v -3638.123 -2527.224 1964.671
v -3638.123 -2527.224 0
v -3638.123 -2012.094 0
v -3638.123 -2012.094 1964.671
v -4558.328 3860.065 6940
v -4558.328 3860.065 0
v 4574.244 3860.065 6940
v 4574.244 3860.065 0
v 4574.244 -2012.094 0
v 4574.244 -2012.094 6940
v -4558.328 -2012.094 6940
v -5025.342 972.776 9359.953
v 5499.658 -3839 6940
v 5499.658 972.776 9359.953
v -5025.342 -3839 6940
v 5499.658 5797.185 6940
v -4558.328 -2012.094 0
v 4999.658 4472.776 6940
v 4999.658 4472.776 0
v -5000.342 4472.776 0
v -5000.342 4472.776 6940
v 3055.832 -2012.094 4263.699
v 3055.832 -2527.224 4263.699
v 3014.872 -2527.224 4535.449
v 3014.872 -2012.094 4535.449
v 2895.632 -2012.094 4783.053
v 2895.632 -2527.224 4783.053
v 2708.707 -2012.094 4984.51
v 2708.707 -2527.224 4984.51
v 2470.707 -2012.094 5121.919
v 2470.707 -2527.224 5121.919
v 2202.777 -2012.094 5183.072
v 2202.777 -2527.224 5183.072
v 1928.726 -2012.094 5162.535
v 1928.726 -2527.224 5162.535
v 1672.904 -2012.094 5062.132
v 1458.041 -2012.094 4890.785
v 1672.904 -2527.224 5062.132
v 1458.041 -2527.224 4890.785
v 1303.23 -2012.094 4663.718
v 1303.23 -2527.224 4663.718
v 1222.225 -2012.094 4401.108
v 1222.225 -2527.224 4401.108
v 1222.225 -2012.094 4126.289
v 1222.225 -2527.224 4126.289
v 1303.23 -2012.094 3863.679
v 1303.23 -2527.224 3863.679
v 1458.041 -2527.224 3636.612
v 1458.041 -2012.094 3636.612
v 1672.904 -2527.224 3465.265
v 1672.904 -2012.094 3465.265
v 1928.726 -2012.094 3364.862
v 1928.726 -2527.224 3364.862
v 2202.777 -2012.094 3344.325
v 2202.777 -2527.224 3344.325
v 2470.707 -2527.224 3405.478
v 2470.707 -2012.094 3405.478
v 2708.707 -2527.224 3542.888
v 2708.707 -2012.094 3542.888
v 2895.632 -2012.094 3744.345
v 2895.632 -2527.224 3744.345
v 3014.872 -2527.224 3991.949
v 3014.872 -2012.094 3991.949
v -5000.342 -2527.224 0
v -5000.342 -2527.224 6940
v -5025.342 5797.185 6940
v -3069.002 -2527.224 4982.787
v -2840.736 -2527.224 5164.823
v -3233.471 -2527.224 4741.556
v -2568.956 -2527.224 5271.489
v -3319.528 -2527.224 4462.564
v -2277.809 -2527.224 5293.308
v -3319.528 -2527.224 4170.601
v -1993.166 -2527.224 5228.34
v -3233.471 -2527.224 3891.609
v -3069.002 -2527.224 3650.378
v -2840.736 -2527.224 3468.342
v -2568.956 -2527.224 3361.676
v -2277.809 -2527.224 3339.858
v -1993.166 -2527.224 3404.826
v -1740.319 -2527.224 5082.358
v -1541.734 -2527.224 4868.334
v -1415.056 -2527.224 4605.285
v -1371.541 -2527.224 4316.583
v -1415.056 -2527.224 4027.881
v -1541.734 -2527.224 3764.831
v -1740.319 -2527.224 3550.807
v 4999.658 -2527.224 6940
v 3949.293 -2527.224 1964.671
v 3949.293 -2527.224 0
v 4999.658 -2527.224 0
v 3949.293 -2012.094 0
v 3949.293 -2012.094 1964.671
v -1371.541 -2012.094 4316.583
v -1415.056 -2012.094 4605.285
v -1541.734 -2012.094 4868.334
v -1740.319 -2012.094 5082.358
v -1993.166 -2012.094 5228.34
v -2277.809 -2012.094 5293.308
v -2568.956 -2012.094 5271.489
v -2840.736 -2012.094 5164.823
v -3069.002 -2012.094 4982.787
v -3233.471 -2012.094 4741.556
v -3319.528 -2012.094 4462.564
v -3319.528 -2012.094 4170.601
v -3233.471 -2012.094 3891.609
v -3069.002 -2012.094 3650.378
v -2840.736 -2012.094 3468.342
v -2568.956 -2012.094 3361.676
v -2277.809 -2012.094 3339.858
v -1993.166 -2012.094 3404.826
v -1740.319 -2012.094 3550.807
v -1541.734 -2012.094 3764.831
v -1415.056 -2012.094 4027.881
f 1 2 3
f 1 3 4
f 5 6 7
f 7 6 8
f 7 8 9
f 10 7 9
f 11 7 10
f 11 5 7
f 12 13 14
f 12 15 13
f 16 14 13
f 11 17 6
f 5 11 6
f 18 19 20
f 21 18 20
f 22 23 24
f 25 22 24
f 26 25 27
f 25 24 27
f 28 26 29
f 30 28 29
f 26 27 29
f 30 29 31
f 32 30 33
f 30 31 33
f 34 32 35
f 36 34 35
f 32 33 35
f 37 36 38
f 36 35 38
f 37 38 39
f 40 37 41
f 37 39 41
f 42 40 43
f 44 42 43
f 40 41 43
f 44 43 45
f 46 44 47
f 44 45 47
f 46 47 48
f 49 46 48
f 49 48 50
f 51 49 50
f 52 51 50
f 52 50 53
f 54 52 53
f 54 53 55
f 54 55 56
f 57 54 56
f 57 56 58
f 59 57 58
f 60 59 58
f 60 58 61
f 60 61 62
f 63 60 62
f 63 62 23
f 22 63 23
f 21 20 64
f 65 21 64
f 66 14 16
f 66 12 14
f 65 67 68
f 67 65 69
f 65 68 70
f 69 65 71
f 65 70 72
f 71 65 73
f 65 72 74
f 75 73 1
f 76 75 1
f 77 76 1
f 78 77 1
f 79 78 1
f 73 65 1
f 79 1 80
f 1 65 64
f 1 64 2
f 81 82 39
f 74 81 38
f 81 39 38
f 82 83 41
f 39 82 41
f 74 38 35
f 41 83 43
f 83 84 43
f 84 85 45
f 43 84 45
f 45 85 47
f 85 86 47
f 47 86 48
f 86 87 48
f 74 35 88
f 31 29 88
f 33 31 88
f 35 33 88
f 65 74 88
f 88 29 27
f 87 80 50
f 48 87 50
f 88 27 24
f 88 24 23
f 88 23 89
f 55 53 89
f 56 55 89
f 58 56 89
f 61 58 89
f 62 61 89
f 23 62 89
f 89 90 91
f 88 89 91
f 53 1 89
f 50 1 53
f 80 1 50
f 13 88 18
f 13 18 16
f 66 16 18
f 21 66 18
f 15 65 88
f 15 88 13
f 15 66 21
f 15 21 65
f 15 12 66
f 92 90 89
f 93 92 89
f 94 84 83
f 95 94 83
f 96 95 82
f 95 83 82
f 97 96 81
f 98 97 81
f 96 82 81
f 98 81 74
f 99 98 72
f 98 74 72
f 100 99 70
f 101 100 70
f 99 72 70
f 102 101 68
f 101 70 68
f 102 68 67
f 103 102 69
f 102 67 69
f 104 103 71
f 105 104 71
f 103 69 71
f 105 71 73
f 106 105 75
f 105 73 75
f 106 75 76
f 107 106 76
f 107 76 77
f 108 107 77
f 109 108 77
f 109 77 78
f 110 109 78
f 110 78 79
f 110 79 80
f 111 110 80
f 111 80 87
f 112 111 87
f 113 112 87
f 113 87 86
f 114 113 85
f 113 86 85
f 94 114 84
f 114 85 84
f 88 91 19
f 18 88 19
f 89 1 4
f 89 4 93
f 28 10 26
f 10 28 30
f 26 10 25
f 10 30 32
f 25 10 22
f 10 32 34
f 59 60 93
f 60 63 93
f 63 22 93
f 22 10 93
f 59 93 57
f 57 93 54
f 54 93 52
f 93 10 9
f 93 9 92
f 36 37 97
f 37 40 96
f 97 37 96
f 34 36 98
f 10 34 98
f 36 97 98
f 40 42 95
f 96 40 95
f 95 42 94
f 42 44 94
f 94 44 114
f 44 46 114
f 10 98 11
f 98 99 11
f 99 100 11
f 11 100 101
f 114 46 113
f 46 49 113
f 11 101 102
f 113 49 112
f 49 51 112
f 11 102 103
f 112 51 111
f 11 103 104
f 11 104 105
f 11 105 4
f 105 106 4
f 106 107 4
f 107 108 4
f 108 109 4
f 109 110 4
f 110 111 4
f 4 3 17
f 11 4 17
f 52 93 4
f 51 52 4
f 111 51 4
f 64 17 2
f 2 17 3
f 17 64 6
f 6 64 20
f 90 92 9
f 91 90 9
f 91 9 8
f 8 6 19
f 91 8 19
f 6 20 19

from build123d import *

# Parameters (mm, degrees)
F0_W          = 1724.6506214142
F0_H          = 612.7116954488
F0_W_2        = 1545.5847382545
F0_W_3        = 4094.7958827019
F0_W_4        = 7587.415933609
F0_H_2        = 515.1302540141
F0_W_5        = 442.0137703419
F0_H_3        = 2709.7913920879
F0_W_6        = 425.414532423
F0_H_4        = 1063.8439655304
F1_DEPTH      = 6940
F2_W          = 7587.415933609
F2_H          = 1964.671254158
F3_DEPTH      = 515.1302540141
F5_DEPTH      = 25
F5_DEPTH_BACK = 10500
F6_R          = 979.4636667312
F7_DEPTH      = 515.1302540141
F6_R_2        = 921.9518456682
F8_DEPTH      = 515.1312540141


# Not quite as in the source:
# - a feature names something its author has since deleted; it is built from what else it names


with BuildPart() as f1:
    # F0 (on Top) → F1 (new body)
    with BuildSketch(Plane.XY):
        Polygon((-3636.5358829498, 4472.7762019796), (-5000.3419220448, 4472.7762019796), (-5000.3419220448, 2272.7479934692), (-4558.3281517029, 2272.7479934692), (-4558.3281517029, 3860.0645065308), (-3636.5358829498, 3860.0645065308), align=None)
        with Locations((-2774.2105722427, 4166.4203542552)):
            Rectangle(F0_W, F0_H)
        with Locations((-1139.0928924084, 4166.4203542552)):
            Rectangle(F0_W_2, F0_H)
        Polygon((4999.6580779552, 4472.7762019796), (3728.4953594208, 4472.7762019796), (3728.4953594208, 3860.0645065308), (4574.2435455322, 3860.0645065308), (4574.2435455322, 2734.4160079956), (4999.6580779552, 2734.4160079956), align=None)
        Polygon((-4558.3281517029, -437.0433986187), (-5000.3419220448, -437.0433986187), (-5000.3419220448, -2527.2237980204), (-3638.1227970123, -2527.2237980204), (-3638.1227970123, -2012.0935440063), (-4558.3281517029, -2012.0935440063), align=None)
        Polygon((3949.2931365967, -2012.0935440063), (3949.2931365967, -2527.2237980204), (4999.6580779552, -2527.2237980204), (4999.6580779552, 1670.5720424652), (4574.2435455322, 1670.5720424652), (4574.2435455322, -2012.0935440063), align=None)
        with Locations((1681.0974180698, 4166.4203542552)):
            Rectangle(F0_W_3, F0_H)
        with Locations((155.5851697922, -2269.6586710134)):
            Rectangle(F0_W_4, F0_H_2)
        with Locations((-4779.3350368738, 917.8522974253)):
            Rectangle(F0_W_5, F0_H_3)
        with Locations((4786.9508117437, 2202.4940252304)):
            Rectangle(F0_W_6, F0_H_4)
    extrude(amount=F1_DEPTH)

    # F2 (on face) → F3 (cut, through all)
    with BuildSketch(Plane.XZ.offset(2527.2237980204)):
        with Locations((155.5851697922, 982.335627079)):
            Rectangle(F2_W, F2_H)
    extrude(amount=-F3_DEPTH, mode=Mode.SUBTRACT)

    # F4 (on face) → F5 (join, two sides)
    with BuildSketch(Plane(origin=(-5000.3419220448, 0, 0), x_dir=(0, -1, 0), z_dir=(-1, 0, 0))) as f5_sk:
        Polygon((-972.7762019796, 9359.9529266357), (-5797.1849441528, 6940), (-4472.7762019796, 6940), (2527.2237980204, 6940), (3838.9999866486, 6940), align=None)
    extrude(amount=F5_DEPTH)
    extrude(f5_sk.sketch, amount=-F5_DEPTH_BACK)

    # F6 (on face) → F7 (cut, through all)
    with BuildSketch(Plane.XZ.offset(2527.2237980204)):
        with Locations((-2351.0043621063, 4316.5826797485)):
            Circle(F6_R)
    extrude(amount=-F7_DEPTH, mode=Mode.SUBTRACT)

    # F6 (on face) → F8 (cut, through all)
    with BuildSketch(Plane.XZ.offset(2527.2237980204)):
        with Locations((-2351.0043621063, 4316.5826797485)):
            Circle(F6_R)
        with Locations((2133.8798999786, 4263.6985778809)):
            Circle(F6_R_2)
    extrude(amount=-F8_DEPTH, mode=Mode.SUBTRACT)


solid = f1.part
